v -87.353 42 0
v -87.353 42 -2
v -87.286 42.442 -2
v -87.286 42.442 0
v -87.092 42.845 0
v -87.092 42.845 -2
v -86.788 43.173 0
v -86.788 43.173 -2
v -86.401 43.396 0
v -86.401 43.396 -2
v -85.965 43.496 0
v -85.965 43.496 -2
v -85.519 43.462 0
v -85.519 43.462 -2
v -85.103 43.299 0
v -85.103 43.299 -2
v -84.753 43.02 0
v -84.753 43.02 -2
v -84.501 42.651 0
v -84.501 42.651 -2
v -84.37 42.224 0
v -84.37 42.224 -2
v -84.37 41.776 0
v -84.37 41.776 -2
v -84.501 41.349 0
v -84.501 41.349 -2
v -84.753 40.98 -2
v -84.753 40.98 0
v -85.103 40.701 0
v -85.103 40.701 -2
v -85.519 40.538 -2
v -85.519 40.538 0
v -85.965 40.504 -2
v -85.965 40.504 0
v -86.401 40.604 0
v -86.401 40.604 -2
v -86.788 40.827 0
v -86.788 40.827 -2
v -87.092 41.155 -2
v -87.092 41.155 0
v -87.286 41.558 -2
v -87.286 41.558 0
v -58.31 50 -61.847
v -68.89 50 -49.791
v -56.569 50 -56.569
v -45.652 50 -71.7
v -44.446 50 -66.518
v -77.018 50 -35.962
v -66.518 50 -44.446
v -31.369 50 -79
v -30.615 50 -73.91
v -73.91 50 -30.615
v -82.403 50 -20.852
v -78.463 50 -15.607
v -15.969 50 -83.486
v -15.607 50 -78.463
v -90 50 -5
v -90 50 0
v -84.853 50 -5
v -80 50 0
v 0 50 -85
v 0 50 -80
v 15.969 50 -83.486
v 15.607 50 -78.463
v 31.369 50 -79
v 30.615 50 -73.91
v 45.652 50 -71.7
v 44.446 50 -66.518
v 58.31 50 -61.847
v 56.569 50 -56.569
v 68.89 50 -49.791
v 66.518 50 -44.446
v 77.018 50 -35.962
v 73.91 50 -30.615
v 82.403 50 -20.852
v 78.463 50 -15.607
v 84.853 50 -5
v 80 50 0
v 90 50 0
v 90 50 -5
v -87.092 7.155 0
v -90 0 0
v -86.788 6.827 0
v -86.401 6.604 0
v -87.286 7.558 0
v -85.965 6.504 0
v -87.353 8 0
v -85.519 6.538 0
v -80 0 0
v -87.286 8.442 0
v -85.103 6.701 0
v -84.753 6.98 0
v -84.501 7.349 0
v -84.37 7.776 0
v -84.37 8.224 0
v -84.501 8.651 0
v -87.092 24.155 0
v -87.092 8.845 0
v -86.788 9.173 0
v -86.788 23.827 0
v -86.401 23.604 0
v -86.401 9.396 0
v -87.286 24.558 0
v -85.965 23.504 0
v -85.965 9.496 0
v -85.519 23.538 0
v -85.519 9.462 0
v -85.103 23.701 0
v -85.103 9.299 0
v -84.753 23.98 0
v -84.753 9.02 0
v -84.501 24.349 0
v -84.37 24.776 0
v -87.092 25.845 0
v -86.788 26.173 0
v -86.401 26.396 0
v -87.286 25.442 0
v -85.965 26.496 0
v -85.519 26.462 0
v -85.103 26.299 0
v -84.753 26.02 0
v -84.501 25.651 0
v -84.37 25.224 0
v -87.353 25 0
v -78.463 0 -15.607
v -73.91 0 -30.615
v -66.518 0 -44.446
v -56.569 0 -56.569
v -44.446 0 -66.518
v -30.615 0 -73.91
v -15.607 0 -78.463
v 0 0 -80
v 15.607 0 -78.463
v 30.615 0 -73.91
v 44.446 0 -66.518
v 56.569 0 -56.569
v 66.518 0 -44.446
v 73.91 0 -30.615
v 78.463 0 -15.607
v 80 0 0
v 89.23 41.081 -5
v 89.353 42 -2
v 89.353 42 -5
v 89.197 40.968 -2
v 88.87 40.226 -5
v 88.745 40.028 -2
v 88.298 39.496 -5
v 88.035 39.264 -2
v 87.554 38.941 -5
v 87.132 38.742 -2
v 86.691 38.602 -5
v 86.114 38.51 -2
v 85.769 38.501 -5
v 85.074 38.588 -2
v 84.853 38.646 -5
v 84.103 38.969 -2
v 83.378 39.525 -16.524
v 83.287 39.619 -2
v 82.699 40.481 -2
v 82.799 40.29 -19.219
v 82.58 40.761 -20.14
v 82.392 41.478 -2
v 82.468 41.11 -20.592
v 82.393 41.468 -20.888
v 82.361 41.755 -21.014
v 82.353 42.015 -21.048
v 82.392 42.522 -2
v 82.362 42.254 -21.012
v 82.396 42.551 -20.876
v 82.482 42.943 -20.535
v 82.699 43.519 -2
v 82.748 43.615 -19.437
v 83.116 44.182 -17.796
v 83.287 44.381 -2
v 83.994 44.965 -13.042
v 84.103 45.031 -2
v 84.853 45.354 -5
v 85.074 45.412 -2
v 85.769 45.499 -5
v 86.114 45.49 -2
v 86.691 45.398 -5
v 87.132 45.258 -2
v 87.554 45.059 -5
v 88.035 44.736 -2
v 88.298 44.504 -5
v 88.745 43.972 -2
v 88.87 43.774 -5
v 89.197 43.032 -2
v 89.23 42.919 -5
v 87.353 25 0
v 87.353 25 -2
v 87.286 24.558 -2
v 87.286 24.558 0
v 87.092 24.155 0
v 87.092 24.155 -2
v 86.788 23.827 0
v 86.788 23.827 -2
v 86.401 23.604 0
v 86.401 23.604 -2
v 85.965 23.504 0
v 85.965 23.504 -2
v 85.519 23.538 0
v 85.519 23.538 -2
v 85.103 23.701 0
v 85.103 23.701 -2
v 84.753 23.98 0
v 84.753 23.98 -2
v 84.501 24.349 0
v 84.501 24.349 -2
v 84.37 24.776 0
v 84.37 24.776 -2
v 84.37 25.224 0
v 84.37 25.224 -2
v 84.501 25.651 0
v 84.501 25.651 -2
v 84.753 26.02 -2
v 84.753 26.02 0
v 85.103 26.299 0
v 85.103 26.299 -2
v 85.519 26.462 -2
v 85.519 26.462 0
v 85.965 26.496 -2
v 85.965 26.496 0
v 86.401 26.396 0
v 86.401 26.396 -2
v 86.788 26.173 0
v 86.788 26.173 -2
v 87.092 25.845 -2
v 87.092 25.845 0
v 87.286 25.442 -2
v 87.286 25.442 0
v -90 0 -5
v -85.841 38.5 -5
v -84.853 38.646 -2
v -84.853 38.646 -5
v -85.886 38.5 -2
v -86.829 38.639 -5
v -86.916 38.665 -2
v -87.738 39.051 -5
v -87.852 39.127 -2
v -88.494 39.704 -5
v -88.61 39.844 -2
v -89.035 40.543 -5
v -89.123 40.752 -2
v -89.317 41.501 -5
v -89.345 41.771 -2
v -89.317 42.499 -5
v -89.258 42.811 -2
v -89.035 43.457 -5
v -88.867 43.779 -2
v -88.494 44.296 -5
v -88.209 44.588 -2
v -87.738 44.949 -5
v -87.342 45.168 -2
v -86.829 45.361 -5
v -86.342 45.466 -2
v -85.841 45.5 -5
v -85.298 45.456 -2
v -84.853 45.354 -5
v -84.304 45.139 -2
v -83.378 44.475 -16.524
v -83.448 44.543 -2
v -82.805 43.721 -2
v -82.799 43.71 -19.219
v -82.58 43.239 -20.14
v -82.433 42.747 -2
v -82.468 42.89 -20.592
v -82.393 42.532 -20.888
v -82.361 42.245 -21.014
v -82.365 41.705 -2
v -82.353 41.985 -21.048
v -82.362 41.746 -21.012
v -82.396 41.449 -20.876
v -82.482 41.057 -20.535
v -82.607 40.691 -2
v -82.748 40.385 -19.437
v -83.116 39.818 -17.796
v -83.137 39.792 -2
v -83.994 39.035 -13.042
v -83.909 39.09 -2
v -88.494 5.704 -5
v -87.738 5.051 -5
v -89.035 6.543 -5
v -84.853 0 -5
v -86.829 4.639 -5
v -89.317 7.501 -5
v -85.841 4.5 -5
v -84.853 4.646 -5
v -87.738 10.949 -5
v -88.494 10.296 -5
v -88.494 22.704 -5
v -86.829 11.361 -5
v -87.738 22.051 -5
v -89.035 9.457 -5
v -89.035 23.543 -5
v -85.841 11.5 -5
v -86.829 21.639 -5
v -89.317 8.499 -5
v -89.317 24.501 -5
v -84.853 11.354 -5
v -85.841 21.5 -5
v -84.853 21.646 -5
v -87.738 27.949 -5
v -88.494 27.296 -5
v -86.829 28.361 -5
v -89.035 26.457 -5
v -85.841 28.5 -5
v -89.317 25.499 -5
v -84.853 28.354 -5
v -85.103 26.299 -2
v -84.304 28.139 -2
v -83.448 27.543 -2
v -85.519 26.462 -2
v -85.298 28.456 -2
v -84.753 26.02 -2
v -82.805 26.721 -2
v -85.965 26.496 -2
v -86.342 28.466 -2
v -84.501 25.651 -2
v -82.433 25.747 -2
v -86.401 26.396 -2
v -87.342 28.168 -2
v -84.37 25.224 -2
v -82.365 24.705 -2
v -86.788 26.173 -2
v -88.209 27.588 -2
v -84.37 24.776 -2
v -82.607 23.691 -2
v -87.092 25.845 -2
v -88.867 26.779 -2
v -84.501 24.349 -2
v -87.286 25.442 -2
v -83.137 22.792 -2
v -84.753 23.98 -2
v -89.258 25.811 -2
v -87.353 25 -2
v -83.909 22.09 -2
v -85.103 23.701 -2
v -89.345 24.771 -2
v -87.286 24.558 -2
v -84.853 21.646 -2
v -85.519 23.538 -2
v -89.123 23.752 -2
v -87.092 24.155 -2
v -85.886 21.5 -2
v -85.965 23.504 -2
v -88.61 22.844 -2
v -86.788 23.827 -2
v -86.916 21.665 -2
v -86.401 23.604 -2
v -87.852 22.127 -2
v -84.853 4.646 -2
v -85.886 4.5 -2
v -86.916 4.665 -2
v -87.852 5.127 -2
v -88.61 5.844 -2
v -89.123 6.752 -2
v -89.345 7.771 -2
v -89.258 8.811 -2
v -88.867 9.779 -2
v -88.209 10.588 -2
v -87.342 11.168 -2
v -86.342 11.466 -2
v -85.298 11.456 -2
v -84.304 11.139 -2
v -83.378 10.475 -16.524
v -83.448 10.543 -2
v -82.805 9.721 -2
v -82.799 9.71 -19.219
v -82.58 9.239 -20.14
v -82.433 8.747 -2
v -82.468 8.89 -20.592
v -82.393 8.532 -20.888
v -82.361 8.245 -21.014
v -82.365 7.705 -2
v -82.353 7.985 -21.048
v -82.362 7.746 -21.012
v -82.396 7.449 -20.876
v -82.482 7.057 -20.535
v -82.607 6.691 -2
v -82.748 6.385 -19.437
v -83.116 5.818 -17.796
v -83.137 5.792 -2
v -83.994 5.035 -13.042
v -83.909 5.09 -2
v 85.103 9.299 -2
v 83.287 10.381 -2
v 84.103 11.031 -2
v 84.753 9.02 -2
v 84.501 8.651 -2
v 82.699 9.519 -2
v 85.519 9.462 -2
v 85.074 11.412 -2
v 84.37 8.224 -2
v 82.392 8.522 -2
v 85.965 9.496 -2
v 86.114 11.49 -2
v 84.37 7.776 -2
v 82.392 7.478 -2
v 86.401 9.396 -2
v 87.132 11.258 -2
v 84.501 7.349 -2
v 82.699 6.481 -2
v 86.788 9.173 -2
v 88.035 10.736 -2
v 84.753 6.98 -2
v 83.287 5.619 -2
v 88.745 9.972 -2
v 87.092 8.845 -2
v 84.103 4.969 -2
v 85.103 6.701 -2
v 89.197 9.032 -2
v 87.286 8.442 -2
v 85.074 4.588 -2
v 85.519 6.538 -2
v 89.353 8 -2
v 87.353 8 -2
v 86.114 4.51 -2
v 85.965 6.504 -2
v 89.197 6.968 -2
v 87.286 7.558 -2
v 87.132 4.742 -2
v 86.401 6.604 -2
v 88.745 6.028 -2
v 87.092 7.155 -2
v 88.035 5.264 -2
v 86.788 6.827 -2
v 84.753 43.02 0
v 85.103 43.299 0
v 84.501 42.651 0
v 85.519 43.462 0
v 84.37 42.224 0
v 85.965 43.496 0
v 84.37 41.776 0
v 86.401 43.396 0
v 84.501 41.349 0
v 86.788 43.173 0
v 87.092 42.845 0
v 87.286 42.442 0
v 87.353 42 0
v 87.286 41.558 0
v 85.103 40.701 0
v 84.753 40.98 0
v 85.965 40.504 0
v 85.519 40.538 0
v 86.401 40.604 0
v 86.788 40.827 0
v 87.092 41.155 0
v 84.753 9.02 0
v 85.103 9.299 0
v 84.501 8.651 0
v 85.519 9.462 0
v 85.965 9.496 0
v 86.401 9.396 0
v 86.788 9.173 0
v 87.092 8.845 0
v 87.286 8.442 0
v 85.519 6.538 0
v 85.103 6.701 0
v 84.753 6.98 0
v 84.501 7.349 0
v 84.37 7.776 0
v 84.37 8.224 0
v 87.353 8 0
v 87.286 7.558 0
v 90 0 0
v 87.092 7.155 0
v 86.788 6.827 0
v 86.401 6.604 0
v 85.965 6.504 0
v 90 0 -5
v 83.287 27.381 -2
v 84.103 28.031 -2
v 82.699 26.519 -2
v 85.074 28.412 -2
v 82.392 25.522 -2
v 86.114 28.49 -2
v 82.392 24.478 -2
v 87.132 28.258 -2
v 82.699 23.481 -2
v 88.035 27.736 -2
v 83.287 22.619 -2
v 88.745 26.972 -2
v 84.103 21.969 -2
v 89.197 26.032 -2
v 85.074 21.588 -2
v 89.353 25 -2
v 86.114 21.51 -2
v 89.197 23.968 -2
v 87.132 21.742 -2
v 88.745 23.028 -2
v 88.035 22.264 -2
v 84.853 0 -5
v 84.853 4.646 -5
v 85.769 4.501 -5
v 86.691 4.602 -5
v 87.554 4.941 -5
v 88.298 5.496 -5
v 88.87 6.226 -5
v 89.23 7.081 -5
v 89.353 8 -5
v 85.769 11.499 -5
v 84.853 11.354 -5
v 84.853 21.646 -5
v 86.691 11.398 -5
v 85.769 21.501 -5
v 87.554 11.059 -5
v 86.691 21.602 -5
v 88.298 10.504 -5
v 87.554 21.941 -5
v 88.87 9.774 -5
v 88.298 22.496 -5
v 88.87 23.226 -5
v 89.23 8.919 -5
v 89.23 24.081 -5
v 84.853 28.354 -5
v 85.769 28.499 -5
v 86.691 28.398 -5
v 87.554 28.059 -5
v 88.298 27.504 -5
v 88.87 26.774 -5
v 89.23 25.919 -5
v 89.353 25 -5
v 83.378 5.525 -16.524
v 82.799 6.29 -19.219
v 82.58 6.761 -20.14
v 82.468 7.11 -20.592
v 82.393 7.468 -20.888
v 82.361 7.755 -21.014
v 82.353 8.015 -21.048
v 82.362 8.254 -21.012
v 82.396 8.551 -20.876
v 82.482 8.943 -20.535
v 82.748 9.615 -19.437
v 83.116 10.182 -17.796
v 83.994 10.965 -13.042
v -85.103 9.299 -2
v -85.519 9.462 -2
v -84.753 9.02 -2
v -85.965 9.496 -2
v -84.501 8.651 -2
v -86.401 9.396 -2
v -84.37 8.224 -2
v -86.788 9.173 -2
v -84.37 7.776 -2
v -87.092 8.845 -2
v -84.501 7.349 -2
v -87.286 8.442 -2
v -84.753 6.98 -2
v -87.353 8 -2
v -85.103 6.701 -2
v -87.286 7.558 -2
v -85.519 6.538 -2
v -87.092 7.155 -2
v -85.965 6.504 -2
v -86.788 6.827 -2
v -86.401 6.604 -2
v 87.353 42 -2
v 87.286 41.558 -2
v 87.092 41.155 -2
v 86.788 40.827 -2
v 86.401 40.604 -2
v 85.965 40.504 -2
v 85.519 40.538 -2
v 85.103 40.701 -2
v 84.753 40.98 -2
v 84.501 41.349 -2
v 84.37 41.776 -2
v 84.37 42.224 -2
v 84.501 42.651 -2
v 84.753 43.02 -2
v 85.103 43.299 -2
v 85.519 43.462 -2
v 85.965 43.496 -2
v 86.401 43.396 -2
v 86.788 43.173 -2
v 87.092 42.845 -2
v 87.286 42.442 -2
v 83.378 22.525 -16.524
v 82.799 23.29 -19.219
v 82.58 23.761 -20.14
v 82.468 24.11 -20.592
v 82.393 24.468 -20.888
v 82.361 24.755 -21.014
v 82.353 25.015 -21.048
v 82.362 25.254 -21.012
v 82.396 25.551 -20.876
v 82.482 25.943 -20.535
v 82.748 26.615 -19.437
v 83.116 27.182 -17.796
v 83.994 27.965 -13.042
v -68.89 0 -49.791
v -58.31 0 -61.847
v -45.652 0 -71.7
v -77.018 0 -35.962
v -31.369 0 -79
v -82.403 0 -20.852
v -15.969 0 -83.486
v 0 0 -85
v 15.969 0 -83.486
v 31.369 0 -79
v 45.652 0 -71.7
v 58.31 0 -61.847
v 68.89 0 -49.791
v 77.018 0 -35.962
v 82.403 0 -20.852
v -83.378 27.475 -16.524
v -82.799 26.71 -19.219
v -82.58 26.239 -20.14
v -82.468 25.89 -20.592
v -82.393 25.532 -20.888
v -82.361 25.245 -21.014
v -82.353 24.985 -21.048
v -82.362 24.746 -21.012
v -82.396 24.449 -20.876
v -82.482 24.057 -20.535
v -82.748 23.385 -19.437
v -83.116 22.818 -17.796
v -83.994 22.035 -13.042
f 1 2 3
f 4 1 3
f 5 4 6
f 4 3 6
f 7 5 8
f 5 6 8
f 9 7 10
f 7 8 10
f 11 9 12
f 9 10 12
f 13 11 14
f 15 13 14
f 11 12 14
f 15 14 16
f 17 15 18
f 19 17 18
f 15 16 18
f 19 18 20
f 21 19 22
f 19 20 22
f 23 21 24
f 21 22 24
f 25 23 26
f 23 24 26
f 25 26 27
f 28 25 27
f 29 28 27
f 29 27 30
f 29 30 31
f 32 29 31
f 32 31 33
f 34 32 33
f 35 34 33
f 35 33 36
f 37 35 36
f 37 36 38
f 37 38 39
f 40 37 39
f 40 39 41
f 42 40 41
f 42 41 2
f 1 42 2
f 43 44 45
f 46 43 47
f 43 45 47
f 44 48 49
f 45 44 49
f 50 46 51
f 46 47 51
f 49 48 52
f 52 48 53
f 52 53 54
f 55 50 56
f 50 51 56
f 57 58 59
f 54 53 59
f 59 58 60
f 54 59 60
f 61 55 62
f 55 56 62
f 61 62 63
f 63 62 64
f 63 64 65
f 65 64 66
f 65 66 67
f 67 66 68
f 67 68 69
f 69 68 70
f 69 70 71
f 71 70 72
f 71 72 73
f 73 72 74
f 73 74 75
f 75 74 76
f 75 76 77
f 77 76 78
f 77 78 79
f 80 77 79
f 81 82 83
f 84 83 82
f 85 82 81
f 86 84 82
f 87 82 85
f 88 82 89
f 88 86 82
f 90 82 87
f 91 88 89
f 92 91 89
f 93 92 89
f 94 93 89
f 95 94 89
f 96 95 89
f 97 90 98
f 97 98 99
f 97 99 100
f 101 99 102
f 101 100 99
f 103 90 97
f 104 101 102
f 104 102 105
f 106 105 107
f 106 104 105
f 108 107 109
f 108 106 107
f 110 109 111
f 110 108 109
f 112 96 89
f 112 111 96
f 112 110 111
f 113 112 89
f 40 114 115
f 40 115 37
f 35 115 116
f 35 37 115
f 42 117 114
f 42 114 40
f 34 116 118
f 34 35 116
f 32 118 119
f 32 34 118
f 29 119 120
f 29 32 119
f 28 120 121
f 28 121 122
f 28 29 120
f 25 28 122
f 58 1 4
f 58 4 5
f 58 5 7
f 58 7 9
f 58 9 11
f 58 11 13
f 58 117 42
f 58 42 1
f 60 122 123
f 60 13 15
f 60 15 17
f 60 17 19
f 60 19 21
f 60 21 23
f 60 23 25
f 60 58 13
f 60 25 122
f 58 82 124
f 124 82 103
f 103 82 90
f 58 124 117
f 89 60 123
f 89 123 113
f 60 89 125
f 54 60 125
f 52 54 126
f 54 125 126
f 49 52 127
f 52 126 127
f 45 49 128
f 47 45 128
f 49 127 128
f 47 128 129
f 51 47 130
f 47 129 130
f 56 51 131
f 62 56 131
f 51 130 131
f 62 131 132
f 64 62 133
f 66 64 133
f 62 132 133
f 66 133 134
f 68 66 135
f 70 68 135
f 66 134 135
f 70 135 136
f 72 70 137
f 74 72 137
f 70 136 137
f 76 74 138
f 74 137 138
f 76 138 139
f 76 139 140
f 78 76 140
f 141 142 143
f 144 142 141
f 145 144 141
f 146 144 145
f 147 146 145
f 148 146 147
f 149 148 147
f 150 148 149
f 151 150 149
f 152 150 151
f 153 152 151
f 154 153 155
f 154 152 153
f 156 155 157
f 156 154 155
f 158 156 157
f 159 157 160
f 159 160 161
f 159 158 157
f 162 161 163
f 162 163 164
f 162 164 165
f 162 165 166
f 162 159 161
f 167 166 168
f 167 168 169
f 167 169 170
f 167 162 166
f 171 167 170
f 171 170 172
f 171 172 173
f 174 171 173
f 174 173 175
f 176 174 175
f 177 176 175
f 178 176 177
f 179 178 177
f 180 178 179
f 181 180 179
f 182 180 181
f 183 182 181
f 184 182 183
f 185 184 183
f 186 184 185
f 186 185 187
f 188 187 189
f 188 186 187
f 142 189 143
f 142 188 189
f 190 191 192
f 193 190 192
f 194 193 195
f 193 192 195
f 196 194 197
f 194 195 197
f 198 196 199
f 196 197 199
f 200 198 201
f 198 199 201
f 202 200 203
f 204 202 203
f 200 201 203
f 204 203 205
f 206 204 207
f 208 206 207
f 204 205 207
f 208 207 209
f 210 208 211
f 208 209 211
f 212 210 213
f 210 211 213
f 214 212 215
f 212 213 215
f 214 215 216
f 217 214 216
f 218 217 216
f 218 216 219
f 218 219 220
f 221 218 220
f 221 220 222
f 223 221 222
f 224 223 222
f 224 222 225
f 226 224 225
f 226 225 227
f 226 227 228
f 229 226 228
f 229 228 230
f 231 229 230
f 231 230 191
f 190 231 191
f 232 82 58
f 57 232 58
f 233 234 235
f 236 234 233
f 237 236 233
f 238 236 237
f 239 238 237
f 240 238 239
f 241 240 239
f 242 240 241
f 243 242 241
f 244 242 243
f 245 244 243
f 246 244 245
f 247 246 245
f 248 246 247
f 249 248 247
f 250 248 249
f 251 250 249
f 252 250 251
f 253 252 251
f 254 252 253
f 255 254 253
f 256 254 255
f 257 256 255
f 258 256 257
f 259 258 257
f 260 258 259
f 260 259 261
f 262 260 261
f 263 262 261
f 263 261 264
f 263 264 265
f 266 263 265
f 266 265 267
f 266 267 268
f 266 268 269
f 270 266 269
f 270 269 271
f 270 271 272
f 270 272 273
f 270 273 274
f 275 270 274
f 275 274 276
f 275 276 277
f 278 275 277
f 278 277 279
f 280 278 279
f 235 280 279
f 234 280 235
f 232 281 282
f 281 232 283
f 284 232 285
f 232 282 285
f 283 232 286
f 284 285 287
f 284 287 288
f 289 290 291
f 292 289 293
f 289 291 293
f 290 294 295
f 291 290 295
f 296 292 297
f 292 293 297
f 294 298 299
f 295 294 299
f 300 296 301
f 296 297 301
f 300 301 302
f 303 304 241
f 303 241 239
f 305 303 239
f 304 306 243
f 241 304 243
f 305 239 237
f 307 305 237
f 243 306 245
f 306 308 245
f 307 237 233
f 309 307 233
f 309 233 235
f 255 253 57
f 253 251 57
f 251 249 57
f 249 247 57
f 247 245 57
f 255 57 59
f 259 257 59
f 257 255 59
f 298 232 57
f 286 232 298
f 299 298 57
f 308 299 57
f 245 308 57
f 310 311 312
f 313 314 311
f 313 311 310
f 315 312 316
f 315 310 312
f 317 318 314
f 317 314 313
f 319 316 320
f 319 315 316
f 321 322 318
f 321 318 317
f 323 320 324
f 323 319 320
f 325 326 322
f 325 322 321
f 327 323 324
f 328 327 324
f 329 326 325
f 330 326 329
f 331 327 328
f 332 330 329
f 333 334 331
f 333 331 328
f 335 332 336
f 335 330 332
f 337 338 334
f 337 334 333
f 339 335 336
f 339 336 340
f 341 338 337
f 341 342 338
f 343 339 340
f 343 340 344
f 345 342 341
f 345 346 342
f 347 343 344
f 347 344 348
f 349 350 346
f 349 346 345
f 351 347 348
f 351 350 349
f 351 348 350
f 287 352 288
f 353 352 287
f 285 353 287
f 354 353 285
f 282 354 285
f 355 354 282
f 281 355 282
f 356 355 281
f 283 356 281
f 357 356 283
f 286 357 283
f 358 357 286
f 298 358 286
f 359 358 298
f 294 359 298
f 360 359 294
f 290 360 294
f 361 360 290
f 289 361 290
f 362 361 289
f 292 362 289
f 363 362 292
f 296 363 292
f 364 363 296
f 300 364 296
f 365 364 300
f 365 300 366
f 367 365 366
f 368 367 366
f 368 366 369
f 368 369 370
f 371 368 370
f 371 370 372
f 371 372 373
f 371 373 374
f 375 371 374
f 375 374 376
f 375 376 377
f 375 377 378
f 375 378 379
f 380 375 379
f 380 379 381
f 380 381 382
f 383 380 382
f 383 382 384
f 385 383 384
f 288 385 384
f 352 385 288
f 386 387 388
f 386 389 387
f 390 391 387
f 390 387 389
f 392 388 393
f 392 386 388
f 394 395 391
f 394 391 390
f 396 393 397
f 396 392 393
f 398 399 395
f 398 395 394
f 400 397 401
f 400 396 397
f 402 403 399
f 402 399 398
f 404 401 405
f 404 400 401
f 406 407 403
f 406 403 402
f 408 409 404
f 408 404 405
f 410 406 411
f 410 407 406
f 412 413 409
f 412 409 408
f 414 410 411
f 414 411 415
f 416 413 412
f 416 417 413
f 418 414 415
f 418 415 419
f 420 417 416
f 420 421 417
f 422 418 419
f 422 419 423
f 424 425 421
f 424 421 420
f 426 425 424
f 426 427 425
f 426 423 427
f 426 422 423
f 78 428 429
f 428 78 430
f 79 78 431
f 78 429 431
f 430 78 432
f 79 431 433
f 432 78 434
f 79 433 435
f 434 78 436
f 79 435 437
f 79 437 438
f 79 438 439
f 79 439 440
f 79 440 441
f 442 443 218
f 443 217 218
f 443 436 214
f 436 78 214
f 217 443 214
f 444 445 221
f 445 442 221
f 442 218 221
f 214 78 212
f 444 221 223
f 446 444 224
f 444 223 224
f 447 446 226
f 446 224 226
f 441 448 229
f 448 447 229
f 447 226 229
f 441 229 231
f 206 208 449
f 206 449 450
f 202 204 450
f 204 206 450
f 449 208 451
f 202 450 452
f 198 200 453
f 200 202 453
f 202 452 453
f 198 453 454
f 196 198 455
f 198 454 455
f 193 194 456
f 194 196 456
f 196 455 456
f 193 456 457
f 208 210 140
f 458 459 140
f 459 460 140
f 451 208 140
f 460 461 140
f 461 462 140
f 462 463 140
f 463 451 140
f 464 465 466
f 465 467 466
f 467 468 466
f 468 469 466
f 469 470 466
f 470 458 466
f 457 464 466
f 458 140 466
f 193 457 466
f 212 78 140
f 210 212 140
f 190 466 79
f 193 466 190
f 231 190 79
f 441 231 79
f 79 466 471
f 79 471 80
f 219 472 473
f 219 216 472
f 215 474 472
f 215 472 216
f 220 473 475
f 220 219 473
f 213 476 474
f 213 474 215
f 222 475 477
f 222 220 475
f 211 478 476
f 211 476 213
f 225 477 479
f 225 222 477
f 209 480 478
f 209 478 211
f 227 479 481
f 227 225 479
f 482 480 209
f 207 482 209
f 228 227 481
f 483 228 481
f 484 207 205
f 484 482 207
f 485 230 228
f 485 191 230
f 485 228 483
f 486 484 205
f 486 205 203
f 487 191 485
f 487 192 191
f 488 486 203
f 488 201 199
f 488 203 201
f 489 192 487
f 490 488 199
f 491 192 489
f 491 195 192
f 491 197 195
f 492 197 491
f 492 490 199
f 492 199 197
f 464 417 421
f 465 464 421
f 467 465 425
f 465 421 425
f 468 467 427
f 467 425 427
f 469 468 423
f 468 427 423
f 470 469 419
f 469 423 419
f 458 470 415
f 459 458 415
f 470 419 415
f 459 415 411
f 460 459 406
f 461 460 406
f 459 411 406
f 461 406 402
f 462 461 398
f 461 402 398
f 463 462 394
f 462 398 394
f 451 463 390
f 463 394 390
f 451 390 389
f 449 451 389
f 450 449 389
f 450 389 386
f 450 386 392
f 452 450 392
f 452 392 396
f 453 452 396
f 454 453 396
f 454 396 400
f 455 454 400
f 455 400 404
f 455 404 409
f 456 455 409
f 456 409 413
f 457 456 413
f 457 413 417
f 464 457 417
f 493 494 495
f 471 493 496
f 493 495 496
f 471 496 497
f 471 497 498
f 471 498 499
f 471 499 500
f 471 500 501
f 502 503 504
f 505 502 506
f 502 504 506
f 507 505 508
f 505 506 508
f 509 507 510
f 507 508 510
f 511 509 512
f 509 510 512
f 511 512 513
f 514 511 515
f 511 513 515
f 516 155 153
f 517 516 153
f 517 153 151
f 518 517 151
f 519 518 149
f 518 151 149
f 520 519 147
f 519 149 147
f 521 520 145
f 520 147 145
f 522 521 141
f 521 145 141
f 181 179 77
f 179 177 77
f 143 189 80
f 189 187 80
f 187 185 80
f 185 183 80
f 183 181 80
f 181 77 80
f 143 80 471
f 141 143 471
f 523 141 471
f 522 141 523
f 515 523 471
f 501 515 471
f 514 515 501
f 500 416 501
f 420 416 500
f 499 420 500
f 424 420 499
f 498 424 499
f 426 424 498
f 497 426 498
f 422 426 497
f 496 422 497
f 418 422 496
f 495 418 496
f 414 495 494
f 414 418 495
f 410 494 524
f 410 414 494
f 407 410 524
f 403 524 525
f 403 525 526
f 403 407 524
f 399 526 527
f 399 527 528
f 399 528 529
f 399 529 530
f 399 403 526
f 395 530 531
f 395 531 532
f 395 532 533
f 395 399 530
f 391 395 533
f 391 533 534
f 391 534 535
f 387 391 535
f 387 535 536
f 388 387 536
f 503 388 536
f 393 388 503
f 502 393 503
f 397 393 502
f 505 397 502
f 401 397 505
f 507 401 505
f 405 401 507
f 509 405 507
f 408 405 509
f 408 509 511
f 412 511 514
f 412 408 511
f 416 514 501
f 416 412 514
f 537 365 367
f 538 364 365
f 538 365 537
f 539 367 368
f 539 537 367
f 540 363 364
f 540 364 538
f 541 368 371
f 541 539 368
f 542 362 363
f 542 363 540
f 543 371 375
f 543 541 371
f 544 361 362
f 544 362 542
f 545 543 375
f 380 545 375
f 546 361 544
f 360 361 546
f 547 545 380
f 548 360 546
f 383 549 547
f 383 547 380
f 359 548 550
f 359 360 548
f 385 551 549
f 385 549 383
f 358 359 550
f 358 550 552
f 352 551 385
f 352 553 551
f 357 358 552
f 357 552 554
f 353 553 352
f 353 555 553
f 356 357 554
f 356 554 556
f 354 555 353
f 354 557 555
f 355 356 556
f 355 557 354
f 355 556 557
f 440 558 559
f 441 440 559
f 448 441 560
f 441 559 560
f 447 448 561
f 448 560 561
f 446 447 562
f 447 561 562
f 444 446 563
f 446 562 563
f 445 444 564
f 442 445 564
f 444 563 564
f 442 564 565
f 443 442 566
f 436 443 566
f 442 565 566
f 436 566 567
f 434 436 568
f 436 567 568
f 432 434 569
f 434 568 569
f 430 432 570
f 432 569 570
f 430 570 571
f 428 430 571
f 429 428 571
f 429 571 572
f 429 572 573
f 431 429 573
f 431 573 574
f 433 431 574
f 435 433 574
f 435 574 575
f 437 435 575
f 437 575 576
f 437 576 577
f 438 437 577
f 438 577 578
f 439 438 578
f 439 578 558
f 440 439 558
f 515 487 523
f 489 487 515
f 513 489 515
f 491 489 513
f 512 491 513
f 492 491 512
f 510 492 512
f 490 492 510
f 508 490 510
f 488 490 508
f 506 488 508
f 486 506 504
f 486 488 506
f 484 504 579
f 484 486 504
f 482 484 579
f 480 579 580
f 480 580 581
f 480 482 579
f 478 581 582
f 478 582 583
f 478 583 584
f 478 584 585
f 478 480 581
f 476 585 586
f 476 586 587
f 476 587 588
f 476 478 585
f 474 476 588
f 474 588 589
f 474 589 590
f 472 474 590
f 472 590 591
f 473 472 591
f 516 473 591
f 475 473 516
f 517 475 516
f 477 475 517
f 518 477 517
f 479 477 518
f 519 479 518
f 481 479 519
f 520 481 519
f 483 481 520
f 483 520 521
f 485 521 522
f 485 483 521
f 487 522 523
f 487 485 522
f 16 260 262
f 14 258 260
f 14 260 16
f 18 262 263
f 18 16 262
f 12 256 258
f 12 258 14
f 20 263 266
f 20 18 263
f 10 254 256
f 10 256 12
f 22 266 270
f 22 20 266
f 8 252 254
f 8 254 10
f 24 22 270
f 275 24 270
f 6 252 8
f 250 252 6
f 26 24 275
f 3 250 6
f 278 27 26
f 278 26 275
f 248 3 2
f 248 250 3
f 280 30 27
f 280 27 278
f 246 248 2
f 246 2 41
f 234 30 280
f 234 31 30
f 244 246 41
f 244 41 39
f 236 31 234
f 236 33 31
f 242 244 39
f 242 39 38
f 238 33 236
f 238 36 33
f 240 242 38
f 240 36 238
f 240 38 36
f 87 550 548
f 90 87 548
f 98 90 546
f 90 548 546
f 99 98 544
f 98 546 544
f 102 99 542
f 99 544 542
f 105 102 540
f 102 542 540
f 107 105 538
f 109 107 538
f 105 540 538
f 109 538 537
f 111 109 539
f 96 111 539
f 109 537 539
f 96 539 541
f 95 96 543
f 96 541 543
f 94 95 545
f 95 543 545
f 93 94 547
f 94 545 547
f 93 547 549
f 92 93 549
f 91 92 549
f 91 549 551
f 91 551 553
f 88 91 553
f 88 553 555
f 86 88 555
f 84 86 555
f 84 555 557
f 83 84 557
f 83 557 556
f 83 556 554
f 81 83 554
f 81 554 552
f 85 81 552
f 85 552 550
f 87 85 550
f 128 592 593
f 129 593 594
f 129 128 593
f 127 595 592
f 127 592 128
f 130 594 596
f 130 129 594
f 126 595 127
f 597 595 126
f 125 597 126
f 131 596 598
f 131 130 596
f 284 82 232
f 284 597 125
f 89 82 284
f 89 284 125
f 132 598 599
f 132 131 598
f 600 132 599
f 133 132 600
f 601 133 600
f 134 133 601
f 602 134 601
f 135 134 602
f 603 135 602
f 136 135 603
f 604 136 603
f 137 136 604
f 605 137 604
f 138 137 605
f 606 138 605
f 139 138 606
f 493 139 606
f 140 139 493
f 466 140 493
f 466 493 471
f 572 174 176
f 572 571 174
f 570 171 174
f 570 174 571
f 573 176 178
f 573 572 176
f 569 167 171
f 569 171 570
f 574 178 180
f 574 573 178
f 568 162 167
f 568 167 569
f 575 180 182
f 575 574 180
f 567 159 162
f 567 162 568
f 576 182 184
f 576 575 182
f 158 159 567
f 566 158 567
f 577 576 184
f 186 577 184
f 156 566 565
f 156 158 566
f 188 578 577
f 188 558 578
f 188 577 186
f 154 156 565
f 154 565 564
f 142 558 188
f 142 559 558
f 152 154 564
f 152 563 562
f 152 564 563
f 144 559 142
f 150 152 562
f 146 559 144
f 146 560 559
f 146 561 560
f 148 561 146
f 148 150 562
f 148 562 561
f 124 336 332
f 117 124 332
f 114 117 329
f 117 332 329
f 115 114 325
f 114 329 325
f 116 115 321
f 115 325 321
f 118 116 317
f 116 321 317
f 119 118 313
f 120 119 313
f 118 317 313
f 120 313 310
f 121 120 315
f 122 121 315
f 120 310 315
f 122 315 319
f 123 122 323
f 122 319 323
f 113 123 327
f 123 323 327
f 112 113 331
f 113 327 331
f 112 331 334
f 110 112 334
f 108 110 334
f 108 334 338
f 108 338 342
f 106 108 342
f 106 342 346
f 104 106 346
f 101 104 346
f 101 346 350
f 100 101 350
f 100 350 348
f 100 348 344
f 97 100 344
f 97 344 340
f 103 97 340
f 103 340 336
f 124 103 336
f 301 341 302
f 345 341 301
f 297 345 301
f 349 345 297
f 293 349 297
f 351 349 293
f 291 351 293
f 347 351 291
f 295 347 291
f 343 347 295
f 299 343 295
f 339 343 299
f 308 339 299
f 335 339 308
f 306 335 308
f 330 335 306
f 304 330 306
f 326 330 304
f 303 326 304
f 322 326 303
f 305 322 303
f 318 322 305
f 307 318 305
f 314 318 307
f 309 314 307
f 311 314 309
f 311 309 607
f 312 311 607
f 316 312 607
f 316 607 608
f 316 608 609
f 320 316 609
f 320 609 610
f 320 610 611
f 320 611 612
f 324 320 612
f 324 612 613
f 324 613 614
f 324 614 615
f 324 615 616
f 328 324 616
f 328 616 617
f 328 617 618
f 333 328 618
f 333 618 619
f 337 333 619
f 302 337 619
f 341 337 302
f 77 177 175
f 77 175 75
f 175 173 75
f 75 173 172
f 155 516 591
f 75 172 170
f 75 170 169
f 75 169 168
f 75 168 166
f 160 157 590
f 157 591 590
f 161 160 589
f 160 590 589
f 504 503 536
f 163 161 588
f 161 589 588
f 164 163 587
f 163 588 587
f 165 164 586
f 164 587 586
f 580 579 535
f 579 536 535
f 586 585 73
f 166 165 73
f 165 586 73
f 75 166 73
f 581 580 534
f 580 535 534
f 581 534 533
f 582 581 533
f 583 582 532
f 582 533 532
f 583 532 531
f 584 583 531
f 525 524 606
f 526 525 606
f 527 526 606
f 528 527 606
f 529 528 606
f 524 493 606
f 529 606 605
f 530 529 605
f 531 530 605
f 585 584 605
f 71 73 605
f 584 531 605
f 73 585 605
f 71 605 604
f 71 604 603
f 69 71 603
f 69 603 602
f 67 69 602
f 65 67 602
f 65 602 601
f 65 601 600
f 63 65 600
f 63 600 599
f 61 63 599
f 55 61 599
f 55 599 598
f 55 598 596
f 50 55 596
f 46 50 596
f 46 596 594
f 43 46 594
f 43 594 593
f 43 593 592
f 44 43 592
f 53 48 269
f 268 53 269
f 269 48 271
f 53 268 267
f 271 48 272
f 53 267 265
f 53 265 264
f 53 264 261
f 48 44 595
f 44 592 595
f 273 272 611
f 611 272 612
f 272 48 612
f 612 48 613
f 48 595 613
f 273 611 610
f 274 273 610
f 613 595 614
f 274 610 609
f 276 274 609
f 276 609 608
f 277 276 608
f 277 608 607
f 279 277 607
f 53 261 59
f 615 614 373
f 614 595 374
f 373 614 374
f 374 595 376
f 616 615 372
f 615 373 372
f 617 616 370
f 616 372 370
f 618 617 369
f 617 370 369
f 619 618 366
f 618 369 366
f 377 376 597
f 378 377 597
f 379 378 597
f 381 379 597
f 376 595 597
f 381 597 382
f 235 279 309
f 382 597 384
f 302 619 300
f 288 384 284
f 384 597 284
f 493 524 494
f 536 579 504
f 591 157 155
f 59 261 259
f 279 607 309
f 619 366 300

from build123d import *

# Parameters (mm, degrees)
BOSS_EXTRUDE1_DEPTH     = 50
SKETCH2_W               = 5
SKETCH2_H               = 50
BOSS_EXTRUDE2_DEPTH     = 5
BOSS_EXTRUDE2_2_DEPTH   = 5
SKETCH3_W               = 8.095126166
SKETCH3_H               = 5
BOSS_EXTRUDE3_DEPTH     = 50
CUT_EXTRUDE1_DEPTH      = 131.384048104
CUT_EXTRUDE1_DEPTH_BACK = 3
SKETCH4_R               = 3.5
SKETCH5_R               = 1.5
CUT_EXTRUDE2_DEPTH      = 133.245983026


with BuildPart() as part:
    # Sketch1 → Boss-Extrude1 (new body)
    with BuildSketch(Plane(origin=(0, 0, 0), x_dir=(1, 0, 0), z_dir=(0, 1, 0))):
        with BuildLine():
            Line((-85, 0), (-80, 0))
            ThreePointArc((-80, 0), (0, 80), (80, 0))
            Line((80, 0), (85, 0))
            ThreePointArc((85, 0), (0, 85), (-85, 0))
        make_face()
    extrude(amount=BOSS_EXTRUDE1_DEPTH)



with BuildPart() as body_2:
    # Sketch2 → Boss-Extrude2 (new body)
    with BuildSketch(Plane.XY):
        with Locations((87.5, 25)):
            Rectangle(SKETCH2_W, SKETCH2_H)
    extrude(amount=-BOSS_EXTRUDE2_DEPTH)


with BuildPart() as body_3:
    # Sketch2 → Boss-Extrude2 2 (new body)
    with BuildSketch(Plane.XY):
        with Locations((-87.5, 25)):
            Rectangle(SKETCH2_W, SKETCH2_H)
    extrude(amount=-BOSS_EXTRUDE2_2_DEPTH)


with BuildPart() as part_1:
    add(part.part)

    add(body_2.part)  # Boss-Extrude3 merges body 2

    add(body_3.part)  # Boss-Extrude3 merges body 3
    # Sketch3 → Boss-Extrude3 (add)
    with BuildSketch(Plane(origin=(0, 50, 0), x_dir=(1, 0, 0), z_dir=(0, 1, 0))):
        with Locations((-85.952436917, 2.5)):
            Rectangle(SKETCH3_W, SKETCH3_H)
        with Locations((85.952436917, 2.5)):
            Rectangle(SKETCH3_W, SKETCH3_H)
    extrude(amount=-BOSS_EXTRUDE3_DEPTH)

    # Sketch4 → Cut-Extrude1 (cut, two sides: drawn at the far end of the back side and taken through both)
    with BuildSketch(Plane(origin=(0, 0, -5), x_dir=(-1, 0, 0), z_dir=(0, 0, -1)).offset(-CUT_EXTRUDE1_DEPTH_BACK)):
        with Locations(Location((85.852813742, 42, 0), (0, 0, 253.398450401))):
            Circle(SKETCH4_R)
        with Locations(Location((85.852813742, 25, 0), (0, 0, 253.398450401))):
            Circle(SKETCH4_R)
        with Locations(Location((85.852813742, 8, 0), (0, 0, 253.398450401))):
            Circle(SKETCH4_R)
        with Locations(Location((-85.852813742, 8, 0), (0, 0, 180))):
            Circle(SKETCH4_R)
        with Locations(Location((-85.852813742, 25, 0), (0, 0, 180))):
            Circle(SKETCH4_R)
        with Locations(Location((-85.852813742, 42, 0), (0, 0, 180))):
            Circle(SKETCH4_R)
    extrude(amount=CUT_EXTRUDE1_DEPTH + CUT_EXTRUDE1_DEPTH_BACK, mode=Mode.SUBTRACT)

    # Sketch5 → Cut-Extrude2 (cut, through all)
    with BuildSketch(Plane(origin=(0, 0, -2), x_dir=(-1, 0, 0), z_dir=(0, 0, -1))):
        with Locations((85.852813742, 42)):
            Circle(SKETCH5_R)
        with Locations((85.852813742, 25)):
            Circle(SKETCH5_R)
        with Locations(Location((-85.852813742, 8, 0), (0, 0, 180))):
            Circle(SKETCH5_R)
        with Locations((85.852813742, 8)):
            Circle(SKETCH5_R)
        with Locations(Location((-85.852813742, 25, 0), (0, 0, 180))):
            Circle(SKETCH5_R)
        with Locations(Location((-85.852813742, 42, 0), (0, 0, 180))):
            Circle(SKETCH5_R)
    extrude(amount=-CUT_EXTRUDE2_DEPTH, mode=Mode.SUBTRACT)


solid = part_1.part
